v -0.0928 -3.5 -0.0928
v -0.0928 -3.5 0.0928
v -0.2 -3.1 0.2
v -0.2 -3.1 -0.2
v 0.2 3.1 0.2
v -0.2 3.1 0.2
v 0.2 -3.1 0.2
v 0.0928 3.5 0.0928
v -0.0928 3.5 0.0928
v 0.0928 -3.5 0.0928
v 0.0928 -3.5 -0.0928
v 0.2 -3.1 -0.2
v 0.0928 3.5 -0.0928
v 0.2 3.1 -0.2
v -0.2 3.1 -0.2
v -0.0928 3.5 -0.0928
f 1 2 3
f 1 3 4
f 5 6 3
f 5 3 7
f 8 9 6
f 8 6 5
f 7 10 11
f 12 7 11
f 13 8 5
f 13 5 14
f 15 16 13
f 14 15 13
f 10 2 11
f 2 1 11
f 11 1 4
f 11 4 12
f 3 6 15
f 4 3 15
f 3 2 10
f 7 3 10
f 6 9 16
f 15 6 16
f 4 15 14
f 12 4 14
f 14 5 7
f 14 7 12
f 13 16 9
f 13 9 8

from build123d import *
from OCP.BRepFilletAPI import BRepFilletAPI_MakeChamfer

# Parameters (mm, degrees)
SKETCH1_W           = 0.4
SKETCH1_H           = 0.4
BOSS_EXTRUDE1_DEPTH = 3.5
CHAMFER2_SIZE       = 0.4
CHAMFER2_SIZE2      = 0.107179677
CHAMFER3_SIZE       = 0.4
CHAMFER3_SIZE2      = 0.107179677


with BuildPart() as part:
    # Sketch1 → Boss-Extrude1 (new, symmetric)
    with BuildSketch(Plane(origin=(0, 0, 0), x_dir=(1, 0, 0), z_dir=(0, 1, 0))):
        Rectangle(SKETCH1_W, SKETCH1_H)
    extrude(amount=BOSS_EXTRUDE1_DEPTH, both=True)

    # Chamfer2: one chamfer whose edges measure the first distance from different faces: ONE call of the kernel's chamfer builder (chamfer() names one face for all edges)
    chamfer2_edges_1 = [part.edges().sort_by_distance(p)[0] for p in [
        (-0.2, 3.5, 0),
    ]]
    chamfer2_side_1 = [part.faces().sort_by_distance(p)[0] for p in [
        (-0.2, 0, 0),
    ]]
    chamfer2_edges_2 = [part.edges().sort_by_distance(p)[0] for p in [
        (0, 3.5, 0.2),
    ]]
    chamfer2_side_2 = [part.faces().sort_by_distance(p)[0] for p in [
        (0, 0, 0.2),
    ]]
    chamfer2_edges_3 = [part.edges().sort_by_distance(p)[0] for p in [
        (0.2, 3.5, 0),
    ]]
    chamfer2_side_3 = [part.faces().sort_by_distance(p)[0] for p in [
        (0.2, 0, 0),
    ]]
    chamfer2_edges_4 = [part.edges().sort_by_distance(p)[0] for p in [
        (0, 3.5, -0.2),
    ]]
    chamfer2_side_4 = [part.faces().sort_by_distance(p)[0] for p in [
        (0, 0, -0.2),
    ]]
    chamfer2 = BRepFilletAPI_MakeChamfer(part.part.solid().wrapped)
    for e in chamfer2_edges_1:
        chamfer2.Add(CHAMFER2_SIZE, CHAMFER2_SIZE2, e.wrapped, chamfer2_side_1[0].wrapped)  # the first distance lies on this face
    for e in chamfer2_edges_2:
        chamfer2.Add(CHAMFER2_SIZE, CHAMFER2_SIZE2, e.wrapped, chamfer2_side_2[0].wrapped)  # the first distance lies on this face
    for e in chamfer2_edges_3:
        chamfer2.Add(CHAMFER2_SIZE, CHAMFER2_SIZE2, e.wrapped, chamfer2_side_3[0].wrapped)  # the first distance lies on this face
    for e in chamfer2_edges_4:
        chamfer2.Add(CHAMFER2_SIZE, CHAMFER2_SIZE2, e.wrapped, chamfer2_side_4[0].wrapped)  # the first distance lies on this face
    add(Compound.cast(chamfer2.Shape()), mode=Mode.REPLACE)

    # Chamfer3: one chamfer whose edges measure the first distance from different faces: ONE call of the kernel's chamfer builder (chamfer() names one face for all edges)
    chamfer3_edges_1 = [part.edges().sort_by_distance(p)[0] for p in [
        (0, -3.5, 0.2),
    ]]
    chamfer3_side_1 = [part.faces().sort_by_distance(p)[0] for p in [
        (0, -0.2, 0.2),
    ]]
    chamfer3_edges_2 = [part.edges().sort_by_distance(p)[0] for p in [
        (-0.2, -3.5, 0),
    ]]
    chamfer3_side_2 = [part.faces().sort_by_distance(p)[0] for p in [
        (-0.2, -0.2, 0),
    ]]
    chamfer3_edges_3 = [part.edges().sort_by_distance(p)[0] for p in [
        (0, -3.5, -0.2),
    ]]
    chamfer3_side_3 = [part.faces().sort_by_distance(p)[0] for p in [
        (0, -0.2, -0.2),
    ]]
    chamfer3_edges_4 = [part.edges().sort_by_distance(p)[0] for p in [
        (0.2, -3.5, 0),
    ]]
    chamfer3_side_4 = [part.faces().sort_by_distance(p)[0] for p in [
        (0.2, -0.2, 0),
    ]]
    chamfer3 = BRepFilletAPI_MakeChamfer(part.part.solid().wrapped)
    for e in chamfer3_edges_1:
        chamfer3.Add(CHAMFER3_SIZE, CHAMFER3_SIZE2, e.wrapped, chamfer3_side_1[0].wrapped)  # the first distance lies on this face
    for e in chamfer3_edges_2:
        chamfer3.Add(CHAMFER3_SIZE, CHAMFER3_SIZE2, e.wrapped, chamfer3_side_2[0].wrapped)  # the first distance lies on this face
    for e in chamfer3_edges_3:
        chamfer3.Add(CHAMFER3_SIZE, CHAMFER3_SIZE2, e.wrapped, chamfer3_side_3[0].wrapped)  # the first distance lies on this face
    for e in chamfer3_edges_4:
        chamfer3.Add(CHAMFER3_SIZE, CHAMFER3_SIZE2, e.wrapped, chamfer3_side_4[0].wrapped)  # the first distance lies on this face
    add(Compound.cast(chamfer3.Shape()), mode=Mode.REPLACE)


solid = part.part
